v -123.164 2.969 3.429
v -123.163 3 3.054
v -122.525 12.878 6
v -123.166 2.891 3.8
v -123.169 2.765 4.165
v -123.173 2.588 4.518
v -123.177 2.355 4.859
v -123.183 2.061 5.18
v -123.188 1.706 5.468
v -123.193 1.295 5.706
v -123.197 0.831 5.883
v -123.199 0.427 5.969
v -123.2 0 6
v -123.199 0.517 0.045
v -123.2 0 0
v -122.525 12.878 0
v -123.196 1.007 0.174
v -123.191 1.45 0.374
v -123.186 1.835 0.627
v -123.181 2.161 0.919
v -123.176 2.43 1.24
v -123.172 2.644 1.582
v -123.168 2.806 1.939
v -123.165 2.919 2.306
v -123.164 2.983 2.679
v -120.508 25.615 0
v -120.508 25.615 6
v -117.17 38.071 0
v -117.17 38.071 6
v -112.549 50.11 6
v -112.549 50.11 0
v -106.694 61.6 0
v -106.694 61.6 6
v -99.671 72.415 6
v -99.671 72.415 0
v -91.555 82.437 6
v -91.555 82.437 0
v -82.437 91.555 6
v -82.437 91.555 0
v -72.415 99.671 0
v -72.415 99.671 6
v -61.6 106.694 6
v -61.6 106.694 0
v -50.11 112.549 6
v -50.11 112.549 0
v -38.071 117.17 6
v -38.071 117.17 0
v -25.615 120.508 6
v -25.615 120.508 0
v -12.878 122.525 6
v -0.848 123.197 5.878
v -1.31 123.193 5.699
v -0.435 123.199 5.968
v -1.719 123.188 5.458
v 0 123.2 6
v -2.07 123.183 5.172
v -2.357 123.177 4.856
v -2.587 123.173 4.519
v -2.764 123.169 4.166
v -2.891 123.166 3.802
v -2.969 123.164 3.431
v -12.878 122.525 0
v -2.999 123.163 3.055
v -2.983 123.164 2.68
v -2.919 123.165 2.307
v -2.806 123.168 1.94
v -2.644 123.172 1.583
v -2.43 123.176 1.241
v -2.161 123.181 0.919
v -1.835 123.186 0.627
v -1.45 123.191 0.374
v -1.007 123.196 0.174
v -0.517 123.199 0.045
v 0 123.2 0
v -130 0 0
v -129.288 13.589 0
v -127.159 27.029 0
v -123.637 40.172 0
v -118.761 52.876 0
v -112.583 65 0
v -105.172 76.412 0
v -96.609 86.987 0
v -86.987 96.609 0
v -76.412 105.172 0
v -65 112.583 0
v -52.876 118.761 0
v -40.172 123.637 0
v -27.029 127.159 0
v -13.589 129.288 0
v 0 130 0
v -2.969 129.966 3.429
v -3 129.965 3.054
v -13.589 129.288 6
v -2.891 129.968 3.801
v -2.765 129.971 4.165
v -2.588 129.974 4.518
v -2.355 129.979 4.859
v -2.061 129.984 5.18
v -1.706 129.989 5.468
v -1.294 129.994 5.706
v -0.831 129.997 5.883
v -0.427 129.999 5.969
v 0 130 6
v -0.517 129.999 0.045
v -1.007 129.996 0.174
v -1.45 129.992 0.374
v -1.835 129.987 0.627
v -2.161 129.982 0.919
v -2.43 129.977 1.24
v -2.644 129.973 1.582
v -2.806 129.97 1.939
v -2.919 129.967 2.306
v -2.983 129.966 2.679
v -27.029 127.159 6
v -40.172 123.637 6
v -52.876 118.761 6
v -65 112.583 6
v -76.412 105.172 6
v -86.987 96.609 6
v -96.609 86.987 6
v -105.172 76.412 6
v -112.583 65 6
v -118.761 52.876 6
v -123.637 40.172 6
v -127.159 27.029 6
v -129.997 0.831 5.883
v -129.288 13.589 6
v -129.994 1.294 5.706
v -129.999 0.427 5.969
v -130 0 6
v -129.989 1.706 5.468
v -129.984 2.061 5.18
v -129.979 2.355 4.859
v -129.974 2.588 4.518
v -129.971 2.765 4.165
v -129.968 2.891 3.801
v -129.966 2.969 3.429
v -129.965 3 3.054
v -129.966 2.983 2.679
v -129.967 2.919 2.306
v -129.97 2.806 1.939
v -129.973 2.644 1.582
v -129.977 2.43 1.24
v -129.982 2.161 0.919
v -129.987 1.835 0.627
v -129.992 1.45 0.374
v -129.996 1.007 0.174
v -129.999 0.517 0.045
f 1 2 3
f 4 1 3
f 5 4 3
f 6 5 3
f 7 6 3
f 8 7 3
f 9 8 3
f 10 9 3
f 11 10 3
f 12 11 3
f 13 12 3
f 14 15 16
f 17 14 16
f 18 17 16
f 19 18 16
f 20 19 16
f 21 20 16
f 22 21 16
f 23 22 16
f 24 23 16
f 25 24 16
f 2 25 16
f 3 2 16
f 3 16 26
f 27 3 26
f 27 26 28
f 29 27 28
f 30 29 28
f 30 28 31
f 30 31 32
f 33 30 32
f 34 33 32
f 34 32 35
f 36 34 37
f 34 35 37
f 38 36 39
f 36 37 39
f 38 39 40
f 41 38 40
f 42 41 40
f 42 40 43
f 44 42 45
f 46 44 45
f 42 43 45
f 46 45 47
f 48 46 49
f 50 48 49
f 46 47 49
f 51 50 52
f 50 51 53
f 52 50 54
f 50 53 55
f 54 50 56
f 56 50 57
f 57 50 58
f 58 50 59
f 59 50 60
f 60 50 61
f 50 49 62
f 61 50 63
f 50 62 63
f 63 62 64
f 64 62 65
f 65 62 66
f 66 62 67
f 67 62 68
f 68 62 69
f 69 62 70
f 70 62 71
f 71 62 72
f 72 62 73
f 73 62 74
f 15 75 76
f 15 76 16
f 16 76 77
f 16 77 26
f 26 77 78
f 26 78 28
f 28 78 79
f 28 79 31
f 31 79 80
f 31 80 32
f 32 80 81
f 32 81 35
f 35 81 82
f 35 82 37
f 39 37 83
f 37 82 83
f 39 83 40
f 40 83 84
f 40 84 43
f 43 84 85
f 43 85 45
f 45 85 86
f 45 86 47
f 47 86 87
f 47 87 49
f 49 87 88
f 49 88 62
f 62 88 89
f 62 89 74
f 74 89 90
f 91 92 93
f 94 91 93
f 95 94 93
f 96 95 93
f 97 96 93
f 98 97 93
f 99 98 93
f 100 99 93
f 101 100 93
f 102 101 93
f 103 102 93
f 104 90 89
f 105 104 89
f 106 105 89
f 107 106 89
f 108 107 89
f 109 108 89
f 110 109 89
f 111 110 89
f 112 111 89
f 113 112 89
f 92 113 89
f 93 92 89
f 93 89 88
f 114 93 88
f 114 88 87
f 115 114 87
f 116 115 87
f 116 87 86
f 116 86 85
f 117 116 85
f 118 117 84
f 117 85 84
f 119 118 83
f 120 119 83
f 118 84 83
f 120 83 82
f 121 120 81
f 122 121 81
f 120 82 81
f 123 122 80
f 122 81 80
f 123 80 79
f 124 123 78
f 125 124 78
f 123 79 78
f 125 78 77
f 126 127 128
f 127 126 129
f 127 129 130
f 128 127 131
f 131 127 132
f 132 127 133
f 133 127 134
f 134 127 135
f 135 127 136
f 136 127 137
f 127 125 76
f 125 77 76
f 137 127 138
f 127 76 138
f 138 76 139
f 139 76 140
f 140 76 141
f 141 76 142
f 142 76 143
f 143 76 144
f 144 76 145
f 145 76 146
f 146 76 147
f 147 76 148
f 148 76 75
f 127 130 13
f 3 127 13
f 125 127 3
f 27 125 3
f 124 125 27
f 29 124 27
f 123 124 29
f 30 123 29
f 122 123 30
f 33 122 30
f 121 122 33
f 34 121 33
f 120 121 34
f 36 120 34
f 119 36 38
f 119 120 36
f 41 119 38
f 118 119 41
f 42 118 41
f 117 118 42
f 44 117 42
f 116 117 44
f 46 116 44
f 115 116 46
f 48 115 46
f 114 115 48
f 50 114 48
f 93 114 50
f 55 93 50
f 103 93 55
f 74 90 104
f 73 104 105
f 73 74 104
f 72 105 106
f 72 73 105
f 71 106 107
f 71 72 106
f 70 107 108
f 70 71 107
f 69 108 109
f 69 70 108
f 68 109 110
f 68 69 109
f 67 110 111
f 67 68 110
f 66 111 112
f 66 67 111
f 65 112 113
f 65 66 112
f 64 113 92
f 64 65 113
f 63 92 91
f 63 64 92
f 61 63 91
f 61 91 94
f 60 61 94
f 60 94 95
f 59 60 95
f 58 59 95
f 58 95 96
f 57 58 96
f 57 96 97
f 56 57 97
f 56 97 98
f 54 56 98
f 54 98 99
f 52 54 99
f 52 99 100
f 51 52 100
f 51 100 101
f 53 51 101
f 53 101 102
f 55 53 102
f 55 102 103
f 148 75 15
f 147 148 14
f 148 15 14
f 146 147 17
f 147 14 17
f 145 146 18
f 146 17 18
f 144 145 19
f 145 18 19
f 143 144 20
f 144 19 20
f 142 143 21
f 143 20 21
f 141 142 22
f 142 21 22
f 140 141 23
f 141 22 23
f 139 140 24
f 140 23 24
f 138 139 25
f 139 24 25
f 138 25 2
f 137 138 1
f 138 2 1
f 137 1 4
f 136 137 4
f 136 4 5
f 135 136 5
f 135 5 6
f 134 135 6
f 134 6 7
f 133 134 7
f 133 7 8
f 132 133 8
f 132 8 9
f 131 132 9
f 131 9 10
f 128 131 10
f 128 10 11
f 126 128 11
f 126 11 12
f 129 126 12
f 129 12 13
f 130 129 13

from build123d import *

# Parameters (mm, degrees)
BOSS_EXTRUDE1_DEPTH = 6
SKETCH6_R           = 3
CUT_EXTRUDE2_DEPTH  = 144
SKETCH7_R           = 3
CUT_EXTRUDE3_DEPTH  = 144


with BuildPart() as part:
    # Sketch5 → Boss-Extrude1 (new body)
    with BuildSketch(Plane.XY):
        with BuildLine():
            Line((0, 123.2), (0, 130))
            ThreePointArc((0, 130), (-91.923881554, 91.923881554), (-130, 0))
            Line((-130, 0), (-123.2, 0))
            ThreePointArc((-123.2, 0), (-87.115555442, 87.115555442), (0, 123.2))
        make_face()
    extrude(amount=BOSS_EXTRUDE1_DEPTH)

    # Sketch6 → Cut-Extrude2 (cut)
    with BuildSketch(Plane(origin=(0, 0, 0), x_dir=(1, 0, 0), z_dir=(0, 1, 0))):
        with Locations((0, -3)):
            Circle(SKETCH6_R)
    extrude(amount=CUT_EXTRUDE2_DEPTH, mode=Mode.SUBTRACT)

    # Sketch7 → Cut-Extrude3 (cut)
    with BuildSketch(Plane(origin=(0, 0, 0), x_dir=(0, 0, -1), z_dir=(1, 0, 0))):
        with Locations((-3, 0)):
            Circle(SKETCH7_R)
    extrude(amount=-CUT_EXTRUDE3_DEPTH, mode=Mode.SUBTRACT)


solid = part.part
